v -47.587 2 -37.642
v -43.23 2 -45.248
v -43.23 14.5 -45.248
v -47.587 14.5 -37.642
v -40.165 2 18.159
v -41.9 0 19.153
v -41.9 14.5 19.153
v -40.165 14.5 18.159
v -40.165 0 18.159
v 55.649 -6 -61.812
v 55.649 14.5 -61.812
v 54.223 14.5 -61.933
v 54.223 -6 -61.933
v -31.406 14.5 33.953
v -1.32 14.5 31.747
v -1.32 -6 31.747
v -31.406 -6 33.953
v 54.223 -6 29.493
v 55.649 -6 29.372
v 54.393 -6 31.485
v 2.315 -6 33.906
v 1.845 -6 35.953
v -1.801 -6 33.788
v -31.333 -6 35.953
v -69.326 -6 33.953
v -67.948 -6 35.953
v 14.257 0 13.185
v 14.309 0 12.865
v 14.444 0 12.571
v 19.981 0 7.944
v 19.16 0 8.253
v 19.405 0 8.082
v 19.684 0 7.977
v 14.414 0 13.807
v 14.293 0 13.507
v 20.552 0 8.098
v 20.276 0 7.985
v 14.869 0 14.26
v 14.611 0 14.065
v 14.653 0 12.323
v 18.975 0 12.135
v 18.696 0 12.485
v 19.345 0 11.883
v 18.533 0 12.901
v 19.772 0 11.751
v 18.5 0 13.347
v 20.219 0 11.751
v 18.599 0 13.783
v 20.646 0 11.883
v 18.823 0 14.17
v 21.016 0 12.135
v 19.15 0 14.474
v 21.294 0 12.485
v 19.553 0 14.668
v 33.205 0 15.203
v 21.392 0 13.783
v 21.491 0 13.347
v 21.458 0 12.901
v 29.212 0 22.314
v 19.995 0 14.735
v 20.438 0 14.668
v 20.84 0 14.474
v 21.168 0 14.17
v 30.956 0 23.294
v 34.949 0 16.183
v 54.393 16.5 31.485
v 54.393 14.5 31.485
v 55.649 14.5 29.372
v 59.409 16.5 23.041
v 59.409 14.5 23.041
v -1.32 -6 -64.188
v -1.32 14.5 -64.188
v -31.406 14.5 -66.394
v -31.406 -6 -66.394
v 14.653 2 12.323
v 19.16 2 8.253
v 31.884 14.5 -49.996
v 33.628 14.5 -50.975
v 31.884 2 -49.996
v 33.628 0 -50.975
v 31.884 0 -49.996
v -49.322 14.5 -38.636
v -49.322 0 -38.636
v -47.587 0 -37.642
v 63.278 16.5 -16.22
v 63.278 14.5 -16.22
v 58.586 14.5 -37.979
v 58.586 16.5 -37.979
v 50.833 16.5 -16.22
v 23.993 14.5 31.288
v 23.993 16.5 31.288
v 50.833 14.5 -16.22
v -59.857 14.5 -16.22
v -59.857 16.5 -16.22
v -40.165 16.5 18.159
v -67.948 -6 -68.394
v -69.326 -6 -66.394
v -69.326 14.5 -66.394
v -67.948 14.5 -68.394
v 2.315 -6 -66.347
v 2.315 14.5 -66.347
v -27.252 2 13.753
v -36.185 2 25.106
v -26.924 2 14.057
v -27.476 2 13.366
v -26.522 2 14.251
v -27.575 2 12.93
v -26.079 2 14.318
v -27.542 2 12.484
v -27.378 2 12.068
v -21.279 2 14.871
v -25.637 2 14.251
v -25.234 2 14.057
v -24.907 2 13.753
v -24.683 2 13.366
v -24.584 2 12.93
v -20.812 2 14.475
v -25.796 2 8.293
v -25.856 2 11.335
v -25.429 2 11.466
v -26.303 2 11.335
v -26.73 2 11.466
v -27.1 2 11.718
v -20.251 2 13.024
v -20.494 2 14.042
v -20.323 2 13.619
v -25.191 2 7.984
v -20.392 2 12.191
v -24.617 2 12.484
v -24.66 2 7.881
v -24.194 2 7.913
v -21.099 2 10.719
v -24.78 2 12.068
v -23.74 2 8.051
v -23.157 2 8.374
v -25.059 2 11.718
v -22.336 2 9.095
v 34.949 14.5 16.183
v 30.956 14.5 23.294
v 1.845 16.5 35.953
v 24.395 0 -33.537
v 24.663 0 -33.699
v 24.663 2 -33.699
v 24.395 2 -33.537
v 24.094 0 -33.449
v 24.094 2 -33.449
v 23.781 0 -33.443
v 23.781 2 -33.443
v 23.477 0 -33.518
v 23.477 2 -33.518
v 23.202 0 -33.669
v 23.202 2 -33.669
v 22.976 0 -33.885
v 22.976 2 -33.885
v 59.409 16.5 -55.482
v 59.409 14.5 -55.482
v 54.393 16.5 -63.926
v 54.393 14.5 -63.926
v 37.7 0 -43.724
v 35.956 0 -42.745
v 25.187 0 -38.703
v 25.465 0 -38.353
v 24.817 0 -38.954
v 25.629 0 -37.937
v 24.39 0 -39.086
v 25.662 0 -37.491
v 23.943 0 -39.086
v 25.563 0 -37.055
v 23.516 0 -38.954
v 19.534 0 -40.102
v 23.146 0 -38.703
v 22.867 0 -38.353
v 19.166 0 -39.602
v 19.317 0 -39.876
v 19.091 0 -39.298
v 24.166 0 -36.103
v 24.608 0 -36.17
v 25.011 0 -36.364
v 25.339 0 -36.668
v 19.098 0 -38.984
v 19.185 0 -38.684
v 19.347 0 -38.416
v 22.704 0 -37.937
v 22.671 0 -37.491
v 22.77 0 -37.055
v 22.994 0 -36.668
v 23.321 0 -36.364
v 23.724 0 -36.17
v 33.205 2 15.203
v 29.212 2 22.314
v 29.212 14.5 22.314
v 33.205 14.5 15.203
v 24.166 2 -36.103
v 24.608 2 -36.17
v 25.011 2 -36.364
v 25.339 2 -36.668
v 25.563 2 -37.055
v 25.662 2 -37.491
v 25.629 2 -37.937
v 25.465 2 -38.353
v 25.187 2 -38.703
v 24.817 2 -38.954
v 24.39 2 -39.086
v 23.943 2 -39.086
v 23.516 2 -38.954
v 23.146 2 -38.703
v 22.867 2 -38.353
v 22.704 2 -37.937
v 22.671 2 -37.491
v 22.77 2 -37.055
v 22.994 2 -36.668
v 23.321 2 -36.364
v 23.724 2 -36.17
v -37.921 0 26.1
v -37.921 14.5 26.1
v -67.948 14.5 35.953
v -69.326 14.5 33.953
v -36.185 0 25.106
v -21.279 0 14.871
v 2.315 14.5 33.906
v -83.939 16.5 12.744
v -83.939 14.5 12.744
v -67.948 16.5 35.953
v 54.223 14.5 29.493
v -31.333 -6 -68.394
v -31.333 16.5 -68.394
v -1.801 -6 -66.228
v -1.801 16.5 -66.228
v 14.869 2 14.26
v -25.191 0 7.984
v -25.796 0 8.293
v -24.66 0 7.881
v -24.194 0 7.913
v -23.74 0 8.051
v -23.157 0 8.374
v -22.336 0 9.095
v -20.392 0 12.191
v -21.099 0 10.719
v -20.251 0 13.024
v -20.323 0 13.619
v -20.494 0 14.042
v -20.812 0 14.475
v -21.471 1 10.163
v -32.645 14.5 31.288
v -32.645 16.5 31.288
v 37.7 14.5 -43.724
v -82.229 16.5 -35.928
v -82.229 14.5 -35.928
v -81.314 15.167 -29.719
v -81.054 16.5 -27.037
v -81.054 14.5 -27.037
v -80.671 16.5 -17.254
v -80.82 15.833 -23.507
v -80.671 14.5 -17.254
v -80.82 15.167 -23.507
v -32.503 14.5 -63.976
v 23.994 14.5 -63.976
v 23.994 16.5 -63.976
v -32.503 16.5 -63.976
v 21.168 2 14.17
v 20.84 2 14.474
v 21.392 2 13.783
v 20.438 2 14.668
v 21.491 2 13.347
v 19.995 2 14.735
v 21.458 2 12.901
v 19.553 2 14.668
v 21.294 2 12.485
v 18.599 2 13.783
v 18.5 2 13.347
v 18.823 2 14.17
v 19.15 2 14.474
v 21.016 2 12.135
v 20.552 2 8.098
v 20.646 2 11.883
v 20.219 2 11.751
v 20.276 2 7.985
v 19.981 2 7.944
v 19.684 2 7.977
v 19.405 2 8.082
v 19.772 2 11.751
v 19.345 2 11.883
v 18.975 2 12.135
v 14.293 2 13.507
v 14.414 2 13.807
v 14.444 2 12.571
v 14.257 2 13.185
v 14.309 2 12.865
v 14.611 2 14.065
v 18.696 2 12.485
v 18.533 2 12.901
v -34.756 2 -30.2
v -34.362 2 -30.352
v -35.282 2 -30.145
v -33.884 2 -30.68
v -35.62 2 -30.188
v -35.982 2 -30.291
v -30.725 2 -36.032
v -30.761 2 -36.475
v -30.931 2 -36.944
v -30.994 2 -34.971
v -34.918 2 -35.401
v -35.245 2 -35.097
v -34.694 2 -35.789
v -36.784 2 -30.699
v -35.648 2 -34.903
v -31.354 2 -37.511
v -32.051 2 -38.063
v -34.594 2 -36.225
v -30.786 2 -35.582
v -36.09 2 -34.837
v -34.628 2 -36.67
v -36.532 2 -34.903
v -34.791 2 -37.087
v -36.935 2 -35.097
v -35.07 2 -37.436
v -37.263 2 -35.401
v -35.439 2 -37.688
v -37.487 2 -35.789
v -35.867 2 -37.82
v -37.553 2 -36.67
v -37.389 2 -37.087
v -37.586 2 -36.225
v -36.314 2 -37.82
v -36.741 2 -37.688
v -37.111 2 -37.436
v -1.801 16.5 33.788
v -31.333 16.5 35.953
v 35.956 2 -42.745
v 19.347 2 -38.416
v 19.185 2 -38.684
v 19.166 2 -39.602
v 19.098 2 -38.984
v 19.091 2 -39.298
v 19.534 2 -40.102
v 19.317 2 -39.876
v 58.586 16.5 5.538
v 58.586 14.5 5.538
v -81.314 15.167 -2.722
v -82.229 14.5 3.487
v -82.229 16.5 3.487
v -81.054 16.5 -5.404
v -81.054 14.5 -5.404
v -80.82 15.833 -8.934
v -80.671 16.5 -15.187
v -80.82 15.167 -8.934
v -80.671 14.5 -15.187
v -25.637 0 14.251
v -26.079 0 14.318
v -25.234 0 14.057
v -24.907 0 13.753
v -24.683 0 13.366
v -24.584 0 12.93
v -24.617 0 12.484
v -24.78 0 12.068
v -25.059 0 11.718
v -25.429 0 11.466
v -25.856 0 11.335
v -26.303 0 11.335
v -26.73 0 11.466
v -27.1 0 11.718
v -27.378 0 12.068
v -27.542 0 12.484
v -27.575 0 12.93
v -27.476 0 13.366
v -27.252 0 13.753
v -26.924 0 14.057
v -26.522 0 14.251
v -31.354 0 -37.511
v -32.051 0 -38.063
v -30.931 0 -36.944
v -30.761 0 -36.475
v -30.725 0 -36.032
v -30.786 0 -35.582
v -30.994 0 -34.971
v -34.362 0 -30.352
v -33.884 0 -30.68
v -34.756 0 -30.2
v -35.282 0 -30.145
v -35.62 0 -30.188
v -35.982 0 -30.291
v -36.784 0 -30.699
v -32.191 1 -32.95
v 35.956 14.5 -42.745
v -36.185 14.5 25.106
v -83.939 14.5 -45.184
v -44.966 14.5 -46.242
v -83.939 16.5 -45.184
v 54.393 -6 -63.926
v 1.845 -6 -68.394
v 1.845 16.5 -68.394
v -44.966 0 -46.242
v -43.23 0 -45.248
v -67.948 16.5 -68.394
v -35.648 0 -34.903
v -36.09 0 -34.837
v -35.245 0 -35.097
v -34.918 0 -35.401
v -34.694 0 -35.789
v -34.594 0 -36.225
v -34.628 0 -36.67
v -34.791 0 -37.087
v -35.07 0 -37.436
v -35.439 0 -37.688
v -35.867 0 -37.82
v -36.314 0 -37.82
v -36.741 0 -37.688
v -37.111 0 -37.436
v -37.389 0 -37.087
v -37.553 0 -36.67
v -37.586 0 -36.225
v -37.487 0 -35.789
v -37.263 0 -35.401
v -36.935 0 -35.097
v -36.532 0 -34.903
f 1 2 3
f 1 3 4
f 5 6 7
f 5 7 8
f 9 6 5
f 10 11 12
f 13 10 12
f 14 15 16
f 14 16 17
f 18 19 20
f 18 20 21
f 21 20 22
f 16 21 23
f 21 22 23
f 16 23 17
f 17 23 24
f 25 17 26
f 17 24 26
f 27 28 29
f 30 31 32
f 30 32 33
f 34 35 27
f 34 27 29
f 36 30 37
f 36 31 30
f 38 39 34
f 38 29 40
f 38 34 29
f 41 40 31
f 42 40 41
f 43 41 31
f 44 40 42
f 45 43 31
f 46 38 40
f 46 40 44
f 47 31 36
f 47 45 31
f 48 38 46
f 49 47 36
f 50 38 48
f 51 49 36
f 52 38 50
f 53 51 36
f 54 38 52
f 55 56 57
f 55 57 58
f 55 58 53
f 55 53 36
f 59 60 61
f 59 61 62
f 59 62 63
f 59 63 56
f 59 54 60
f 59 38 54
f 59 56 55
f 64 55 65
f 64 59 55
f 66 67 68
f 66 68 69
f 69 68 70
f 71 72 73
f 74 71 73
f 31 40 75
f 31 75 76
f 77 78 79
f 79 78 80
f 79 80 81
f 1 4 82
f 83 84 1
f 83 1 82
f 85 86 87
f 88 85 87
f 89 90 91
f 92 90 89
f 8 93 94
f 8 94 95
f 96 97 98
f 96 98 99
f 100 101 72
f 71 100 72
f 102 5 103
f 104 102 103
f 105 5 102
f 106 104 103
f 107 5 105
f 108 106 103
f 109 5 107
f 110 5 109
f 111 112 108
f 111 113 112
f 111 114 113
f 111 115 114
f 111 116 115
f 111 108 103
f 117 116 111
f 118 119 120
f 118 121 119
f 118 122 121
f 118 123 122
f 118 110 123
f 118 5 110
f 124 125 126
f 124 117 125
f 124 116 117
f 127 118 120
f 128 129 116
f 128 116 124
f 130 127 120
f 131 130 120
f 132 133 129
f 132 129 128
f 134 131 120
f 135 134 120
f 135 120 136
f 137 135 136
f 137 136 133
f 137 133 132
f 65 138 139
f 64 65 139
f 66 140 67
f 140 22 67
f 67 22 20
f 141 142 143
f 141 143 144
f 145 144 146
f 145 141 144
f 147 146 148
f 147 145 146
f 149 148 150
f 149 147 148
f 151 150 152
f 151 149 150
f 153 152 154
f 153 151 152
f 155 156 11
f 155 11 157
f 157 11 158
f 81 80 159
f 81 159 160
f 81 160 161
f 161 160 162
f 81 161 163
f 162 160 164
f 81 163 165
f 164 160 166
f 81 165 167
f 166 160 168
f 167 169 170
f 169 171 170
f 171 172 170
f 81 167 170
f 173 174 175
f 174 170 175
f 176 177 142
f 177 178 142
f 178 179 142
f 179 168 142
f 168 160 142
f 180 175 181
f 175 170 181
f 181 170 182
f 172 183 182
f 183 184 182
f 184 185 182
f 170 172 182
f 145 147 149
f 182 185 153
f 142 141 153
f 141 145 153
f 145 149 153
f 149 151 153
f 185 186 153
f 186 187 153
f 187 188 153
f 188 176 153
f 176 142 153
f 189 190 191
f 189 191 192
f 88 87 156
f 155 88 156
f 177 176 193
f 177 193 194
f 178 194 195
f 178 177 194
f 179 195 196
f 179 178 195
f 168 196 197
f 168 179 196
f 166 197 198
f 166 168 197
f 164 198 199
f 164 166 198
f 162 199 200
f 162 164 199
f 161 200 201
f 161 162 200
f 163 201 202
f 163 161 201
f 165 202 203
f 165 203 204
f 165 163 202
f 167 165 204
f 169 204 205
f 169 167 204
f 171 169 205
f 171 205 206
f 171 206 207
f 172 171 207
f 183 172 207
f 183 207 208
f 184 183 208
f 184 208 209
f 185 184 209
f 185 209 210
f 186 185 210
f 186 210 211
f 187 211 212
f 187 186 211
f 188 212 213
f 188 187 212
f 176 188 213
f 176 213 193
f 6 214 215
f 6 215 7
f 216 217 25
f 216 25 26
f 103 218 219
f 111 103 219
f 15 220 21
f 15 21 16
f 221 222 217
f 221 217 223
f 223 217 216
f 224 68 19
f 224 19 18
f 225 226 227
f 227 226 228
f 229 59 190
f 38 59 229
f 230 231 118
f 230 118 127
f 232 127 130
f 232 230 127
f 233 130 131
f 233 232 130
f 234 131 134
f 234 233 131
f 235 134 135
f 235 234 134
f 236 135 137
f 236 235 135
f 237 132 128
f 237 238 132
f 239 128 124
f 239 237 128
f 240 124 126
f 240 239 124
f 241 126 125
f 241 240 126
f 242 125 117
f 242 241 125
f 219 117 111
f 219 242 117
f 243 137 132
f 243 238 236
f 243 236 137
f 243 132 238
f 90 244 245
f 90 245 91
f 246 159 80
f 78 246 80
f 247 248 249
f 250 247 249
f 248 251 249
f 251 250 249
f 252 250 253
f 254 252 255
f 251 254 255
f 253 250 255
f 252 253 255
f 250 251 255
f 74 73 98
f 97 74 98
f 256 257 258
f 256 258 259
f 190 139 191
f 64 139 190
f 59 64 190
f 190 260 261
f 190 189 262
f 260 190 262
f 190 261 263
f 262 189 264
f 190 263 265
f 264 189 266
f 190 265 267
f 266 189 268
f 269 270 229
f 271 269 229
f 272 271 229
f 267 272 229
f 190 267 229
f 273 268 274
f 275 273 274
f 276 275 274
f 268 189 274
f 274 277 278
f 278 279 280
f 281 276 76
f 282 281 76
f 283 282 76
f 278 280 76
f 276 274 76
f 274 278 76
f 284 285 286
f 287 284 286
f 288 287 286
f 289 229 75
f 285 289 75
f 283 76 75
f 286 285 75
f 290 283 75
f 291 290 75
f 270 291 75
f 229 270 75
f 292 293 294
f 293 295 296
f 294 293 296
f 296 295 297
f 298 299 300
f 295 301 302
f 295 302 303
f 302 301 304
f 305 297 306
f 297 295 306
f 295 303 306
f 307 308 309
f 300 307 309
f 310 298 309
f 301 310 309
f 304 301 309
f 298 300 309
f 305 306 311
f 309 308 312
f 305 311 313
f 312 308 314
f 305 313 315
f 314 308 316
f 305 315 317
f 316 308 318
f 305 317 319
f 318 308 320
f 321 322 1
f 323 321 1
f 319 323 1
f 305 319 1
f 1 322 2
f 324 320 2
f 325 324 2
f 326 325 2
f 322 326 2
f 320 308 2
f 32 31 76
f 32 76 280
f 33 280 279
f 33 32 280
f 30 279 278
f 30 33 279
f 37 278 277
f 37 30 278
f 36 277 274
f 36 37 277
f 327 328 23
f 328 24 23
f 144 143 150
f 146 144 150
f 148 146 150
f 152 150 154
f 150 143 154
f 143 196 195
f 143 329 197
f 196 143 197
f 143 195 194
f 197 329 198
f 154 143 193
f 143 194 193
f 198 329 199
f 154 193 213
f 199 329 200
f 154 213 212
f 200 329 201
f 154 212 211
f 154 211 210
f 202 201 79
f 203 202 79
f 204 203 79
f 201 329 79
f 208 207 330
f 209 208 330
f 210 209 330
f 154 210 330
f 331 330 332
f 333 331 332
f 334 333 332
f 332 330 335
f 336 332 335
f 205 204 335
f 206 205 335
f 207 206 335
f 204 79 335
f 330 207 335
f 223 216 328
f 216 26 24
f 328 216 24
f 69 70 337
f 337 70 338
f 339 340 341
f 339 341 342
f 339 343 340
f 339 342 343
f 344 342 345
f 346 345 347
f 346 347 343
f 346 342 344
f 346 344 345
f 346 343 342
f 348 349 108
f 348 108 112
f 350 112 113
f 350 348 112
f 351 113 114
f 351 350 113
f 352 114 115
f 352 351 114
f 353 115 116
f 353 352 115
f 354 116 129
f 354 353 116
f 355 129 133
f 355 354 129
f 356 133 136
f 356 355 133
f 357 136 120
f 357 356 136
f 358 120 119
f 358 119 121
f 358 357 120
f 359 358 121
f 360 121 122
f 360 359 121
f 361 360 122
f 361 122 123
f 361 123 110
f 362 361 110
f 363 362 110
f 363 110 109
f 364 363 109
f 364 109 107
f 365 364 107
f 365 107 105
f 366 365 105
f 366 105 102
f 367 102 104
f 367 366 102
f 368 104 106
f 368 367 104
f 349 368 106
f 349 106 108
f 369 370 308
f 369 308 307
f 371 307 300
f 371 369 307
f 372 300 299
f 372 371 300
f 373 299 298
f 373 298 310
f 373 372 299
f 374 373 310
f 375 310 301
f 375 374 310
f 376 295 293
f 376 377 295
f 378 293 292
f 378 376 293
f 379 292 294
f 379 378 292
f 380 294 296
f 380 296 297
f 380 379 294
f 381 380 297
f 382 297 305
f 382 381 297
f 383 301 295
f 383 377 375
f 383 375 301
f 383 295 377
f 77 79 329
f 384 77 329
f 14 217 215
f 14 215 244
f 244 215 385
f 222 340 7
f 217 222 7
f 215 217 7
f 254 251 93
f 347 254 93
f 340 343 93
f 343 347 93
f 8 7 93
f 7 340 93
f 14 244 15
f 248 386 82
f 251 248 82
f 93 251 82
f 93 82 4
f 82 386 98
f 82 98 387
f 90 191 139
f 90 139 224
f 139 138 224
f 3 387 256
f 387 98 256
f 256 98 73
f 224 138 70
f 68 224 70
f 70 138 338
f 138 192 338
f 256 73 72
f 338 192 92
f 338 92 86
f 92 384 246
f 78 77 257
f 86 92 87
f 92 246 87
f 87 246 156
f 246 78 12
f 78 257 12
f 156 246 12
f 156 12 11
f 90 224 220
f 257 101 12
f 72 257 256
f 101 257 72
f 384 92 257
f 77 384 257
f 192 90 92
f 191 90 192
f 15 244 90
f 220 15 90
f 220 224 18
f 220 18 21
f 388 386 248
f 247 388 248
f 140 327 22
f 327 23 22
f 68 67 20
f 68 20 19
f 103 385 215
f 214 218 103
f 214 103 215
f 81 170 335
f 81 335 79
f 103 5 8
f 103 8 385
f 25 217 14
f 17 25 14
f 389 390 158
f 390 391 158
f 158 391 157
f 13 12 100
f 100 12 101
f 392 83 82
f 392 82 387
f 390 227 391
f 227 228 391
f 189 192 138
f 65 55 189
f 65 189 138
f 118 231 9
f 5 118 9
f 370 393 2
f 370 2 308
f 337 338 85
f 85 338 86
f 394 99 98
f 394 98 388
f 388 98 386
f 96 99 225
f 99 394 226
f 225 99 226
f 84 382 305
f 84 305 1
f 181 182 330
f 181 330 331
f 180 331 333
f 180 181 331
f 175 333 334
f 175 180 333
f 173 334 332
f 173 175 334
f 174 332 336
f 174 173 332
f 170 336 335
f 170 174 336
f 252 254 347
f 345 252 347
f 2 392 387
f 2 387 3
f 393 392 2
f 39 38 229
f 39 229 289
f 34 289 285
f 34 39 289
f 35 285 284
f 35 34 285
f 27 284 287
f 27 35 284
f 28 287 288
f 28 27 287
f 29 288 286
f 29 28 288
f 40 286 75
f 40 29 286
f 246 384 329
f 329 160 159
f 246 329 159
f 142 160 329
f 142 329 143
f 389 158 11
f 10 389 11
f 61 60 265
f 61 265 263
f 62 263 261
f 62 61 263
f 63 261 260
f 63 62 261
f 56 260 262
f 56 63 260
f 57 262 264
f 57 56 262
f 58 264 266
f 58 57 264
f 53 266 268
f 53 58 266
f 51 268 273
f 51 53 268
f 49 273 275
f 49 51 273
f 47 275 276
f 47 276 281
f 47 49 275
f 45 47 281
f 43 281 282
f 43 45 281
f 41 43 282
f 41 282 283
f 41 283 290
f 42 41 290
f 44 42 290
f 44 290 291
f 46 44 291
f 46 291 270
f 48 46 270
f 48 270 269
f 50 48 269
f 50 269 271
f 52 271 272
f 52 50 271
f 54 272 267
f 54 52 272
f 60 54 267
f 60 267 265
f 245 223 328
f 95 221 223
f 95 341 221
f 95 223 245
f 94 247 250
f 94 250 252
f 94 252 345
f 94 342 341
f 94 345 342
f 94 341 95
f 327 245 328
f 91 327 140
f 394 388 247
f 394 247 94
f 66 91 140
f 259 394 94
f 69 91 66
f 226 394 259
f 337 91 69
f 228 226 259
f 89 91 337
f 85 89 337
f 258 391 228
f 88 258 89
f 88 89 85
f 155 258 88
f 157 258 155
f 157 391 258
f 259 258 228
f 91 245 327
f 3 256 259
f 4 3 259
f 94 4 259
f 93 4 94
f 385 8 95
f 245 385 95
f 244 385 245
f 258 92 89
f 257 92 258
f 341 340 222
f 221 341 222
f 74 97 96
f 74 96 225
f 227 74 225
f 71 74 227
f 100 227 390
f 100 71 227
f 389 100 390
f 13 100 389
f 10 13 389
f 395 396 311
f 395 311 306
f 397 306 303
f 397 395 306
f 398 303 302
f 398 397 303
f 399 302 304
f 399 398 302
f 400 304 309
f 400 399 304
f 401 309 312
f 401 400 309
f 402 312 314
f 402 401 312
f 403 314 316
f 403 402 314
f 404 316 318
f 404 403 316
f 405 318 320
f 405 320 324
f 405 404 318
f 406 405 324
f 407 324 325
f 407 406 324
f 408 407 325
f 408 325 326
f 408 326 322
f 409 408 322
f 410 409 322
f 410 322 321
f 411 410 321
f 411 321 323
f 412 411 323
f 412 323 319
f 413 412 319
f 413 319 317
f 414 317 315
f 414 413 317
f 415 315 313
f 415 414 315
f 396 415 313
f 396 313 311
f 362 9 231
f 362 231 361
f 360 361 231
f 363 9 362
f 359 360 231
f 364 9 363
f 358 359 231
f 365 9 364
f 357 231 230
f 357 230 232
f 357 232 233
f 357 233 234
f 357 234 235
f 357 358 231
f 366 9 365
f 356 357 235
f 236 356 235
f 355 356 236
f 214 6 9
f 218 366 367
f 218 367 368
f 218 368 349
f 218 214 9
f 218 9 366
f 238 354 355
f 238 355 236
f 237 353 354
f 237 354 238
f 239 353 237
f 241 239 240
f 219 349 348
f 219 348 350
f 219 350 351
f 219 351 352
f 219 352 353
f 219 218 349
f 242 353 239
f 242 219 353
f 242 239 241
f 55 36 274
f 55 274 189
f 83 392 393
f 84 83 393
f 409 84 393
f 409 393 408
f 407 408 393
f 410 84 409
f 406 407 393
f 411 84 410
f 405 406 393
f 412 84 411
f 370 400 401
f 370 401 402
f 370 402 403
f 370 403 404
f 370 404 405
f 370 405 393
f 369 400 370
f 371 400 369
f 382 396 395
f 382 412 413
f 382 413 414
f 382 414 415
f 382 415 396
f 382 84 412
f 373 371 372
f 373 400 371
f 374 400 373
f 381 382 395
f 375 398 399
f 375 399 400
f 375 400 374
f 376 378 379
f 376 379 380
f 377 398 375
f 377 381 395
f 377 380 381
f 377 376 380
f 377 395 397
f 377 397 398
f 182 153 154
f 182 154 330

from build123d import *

# Parameters (mm, degrees)
SKETCH2_R             = 1.5
BOSS_EXTRUDE3_DEPTH   = 2
BOSS_EXTRUDE3_2_DEPTH = 2
BOSS_EXTRUDE3_3_DEPTH = 2
BOSS_EXTRUDE3_4_DEPTH = 2
BOSS_EXTRUDE7_DEPTH   = 14.5
BOSS_EXTRUDE8_DEPTH   = 2
BOSS_EXTRUDE9_DEPTH   = 20.5


with BuildPart() as part:
    # Sketch2 → Boss-Extrude3 (new body)
    with BuildSketch(Plane(origin=(0, 0, 0), x_dir=(1, 0, 0), z_dir=(0, 1, 0))):
        with BuildLine():
            Line((-43.230453913, 45.247658967), (-32.051235735, 38.062807212))
            add(Edge.make_bspline(
                [(-32.051235735, 38.062807212), (-29.653859452, 36.522020287), (-32.359204514, 33.058015897), (-34.393292894, 29.162596744), (-36.78390878, 30.699038781)],
                knots=[0, 0, 0, 0, 0.5, 1, 1, 1, 1], degree=3))
            Line((-36.78390878, 30.699038781), (-47.586935967, 37.642113656))
            Line((-47.586935967, 37.642113656), (-43.230453913, 45.247658967))
        make_face()
        with Locations(Location((-36.090252253, 36.336715974, 0), (0, 0, 270))):
            Circle(SKETCH2_R, mode=Mode.SUBTRACT)
    extrude(amount=BOSS_EXTRUDE3_DEPTH)



with BuildPart() as body_2:
    # Sketch2 → Boss-Extrude3 2 (new body)
    with BuildSketch(Plane(origin=(0, 0, 0), x_dir=(1, 0, 0), z_dir=(0, 1, 0))):
        with BuildLine():
            Line((-36.185423109, -25.10610692), (-21.279130416, -14.871322122))
            add(Edge.make_bspline(
                [(-25.795747584, -8.293165489), (-24.143697719, -7.158854283), (-21.111071083, -9.916279371), (-19.518538576, -13.662485091), (-21.279130416, -14.871322122)],
                knots=[0, 0, 0, 0, 0.5, 1, 1, 1, 1], degree=3))
            Line((-25.795747584, -8.293165489), (-40.164732197, -18.159030081))
            Line((-40.164732197, -18.159030081), (-36.185423109, -25.10610692))
        make_face()
        with Locations(Location((-26.079416612, -12.817810533, 0), (0, 0, 270))):
            Circle(SKETCH2_R, mode=Mode.SUBTRACT)
    extrude(amount=BOSS_EXTRUDE3_2_DEPTH)


with BuildPart() as body_3:
    # Sketch2 → Boss-Extrude3 3 (new body)
    with BuildSketch(Plane(origin=(0, 0, 0), x_dir=(1, 0, 0), z_dir=(0, 1, 0))):
        with BuildLine():
            Line((29.211666773, -22.314450198), (14.869230537, -14.260003913))
            ThreePointArc((14.869230537, -14.260003913), (14.264243858, -13.347032924), (14.652672015, -12.322997536))
            Line((14.652672015, -12.322997536), (19.160499642, -8.253264805))
            ThreePointArc((19.160499642, -8.253264805), (19.831311373, -7.951400174), (20.552224713, -8.097669073))
            Line((20.552224713, -8.097669073), (33.205147834, -15.203316117))
            Line((33.205147834, -15.203316117), (29.211666773, -22.314450198))
        make_face()
        with Locations(Location((19.995405598, -13.234640771, 0), (0, 0, 270))):
            Circle(SKETCH2_R, mode=Mode.SUBTRACT)
    extrude(amount=BOSS_EXTRUDE3_3_DEPTH)


with BuildPart() as body_4:
    # Sketch2 → Boss-Extrude3 4 (new body)
    with BuildSketch(Plane(origin=(0, 0, 0), x_dir=(1, 0, 0), z_dir=(0, 1, 0))):
        with BuildLine():
            Line((35.956282792, 42.745174925), (24.662993698, 33.699023938))
            ThreePointArc((24.662993698, 33.699023938), (23.78100089, 33.442857668), (22.976200889, 33.885383856))
            Line((22.976200889, 33.885383856), (19.347327143, 38.415699606))
            ThreePointArc((19.347327143, 38.415699606), (19.091160873, 39.297692414), (19.533687061, 40.102492416))
            Line((19.533687061, 40.102492416), (31.884499443, 49.995740759))
            Line((31.884499443, 49.995740759), (35.956282792, 42.745174925))
        make_face()
        with Locations(Location((24.166347117, 37.603010106, 0), (0, 0, 270))):
            Circle(SKETCH2_R, mode=Mode.SUBTRACT)
    extrude(amount=BOSS_EXTRUDE3_4_DEPTH)


with BuildPart() as part_1:
    add(part.part)

    add(body_2.part)  # Boss-Extrude7 merges body 2

    add(body_3.part)  # Boss-Extrude7 merges body 3

    add(body_4.part)  # Boss-Extrude7 merges body 4
    # Sketch7 → Boss-Extrude7 (add)
    with BuildSketch(Plane.XZ):
        Polygon((-36.185423109, 25.10610692), (-37.920880681, 26.100182881), (-41.900189769, 19.153106042), (-40.164732197, 18.159030081), align=None)
        Polygon((-43.230453913, -45.247658967), (-47.586935967, -37.642113656), (-49.322393538, -38.636189617), (-44.965911485, -46.241734929), align=None)
        Polygon((31.884499443, -49.995740759), (35.956282792, -42.745174925), (37.700117882, -43.724480381), (33.628334533, -50.975046216), align=None)
        Polygon((29.211666773, 22.314450198), (33.205147834, 15.203316117), (34.948982925, 16.182621573), (30.955501863, 23.293755654), align=None)
    extrude(amount=-BOSS_EXTRUDE7_DEPTH)

    # Sketch8 → Boss-Extrude8 (add)
    with BuildSketch(Plane(origin=(0, 14.5, 0), x_dir=(1, 0, 0), z_dir=(0, 1, 0))):
        with BuildLine():
            Line((-83.939033809, -12.743691802), (-67.948382544, -35.953321652))
            Line((-67.948382544, -35.953321652), (-31.333133825, -35.953321652))
            Line((-31.333133825, -35.953321652), (-1.800901789, -33.787598607))
            Line((-1.800901789, -33.787598607), (1.845003483, -35.953321652))
            Line((1.845003483, -35.953321652), (54.392894937, -31.485495915))
            Line((54.392894937, -31.485495915), (59.409090539, -23.040937859))
            Line((59.409090539, -23.040937859), (58.585665433, -5.537982821))
            Line((58.585665433, -5.537982821), (63.277626353, 16.220382558))
            Line((63.277626353, 16.220382558), (58.585665433, 37.978747936))
            Line((58.585665433, 37.978747936), (59.409090539, 55.481702974))
            Line((59.409090539, 55.481702974), (54.392894937, 63.926261031))
            Line((54.392894937, 63.926261031), (1.845003483, 68.394086768))
            Line((1.845003483, 68.394086768), (-1.800901789, 66.228363722))
            Line((-1.800901789, 66.228363722), (-31.333133825, 68.394086768))
            Line((-31.333133825, 68.394086768), (-67.948382544, 68.394086768))
            Line((-67.948382544, 68.394086768), (-83.939033809, 45.184456918))
            Line((-83.939033809, 45.184456918), (-82.229044773, 35.927906641))
            add(Edge.make_bspline(
                [(-82.229044773, 35.927906641), (-81.079922832, 29.707454467), (-80.671423408, 23.540442654), (-80.671423408, 17.253629197)],
                knots=[0, 0, 0, 0, 1, 1, 1, 1], degree=3))
            Line((-80.671423408, 17.253629197), (-80.671423408, 15.187135918))
            add(Edge.make_bspline(
                [(-82.229044773, -3.487141526), (-81.079922832, 2.733310648), (-80.671423408, 8.900322461), (-80.671423408, 15.187135918)],
                knots=[0, 0, 0, 0, 1, 1, 1, 1], degree=3))
            Line((-82.229044773, -3.487141526), (-83.939033809, -12.743691802))
        make_face()
        Polygon((-59.857375923, 16.220382558), (-40.164732197, -18.159030081), (-32.644643784, -31.287598607), (23.993388186, -31.287598607), (50.833438729, 16.220382558), (23.99393098, 63.976016309), (-32.502787546, 63.976016309), align=None, mode=Mode.SUBTRACT)
    extrude(amount=BOSS_EXTRUDE8_DEPTH)

    # Sketch9 → Boss-Extrude9 (add)
    with BuildSketch(Plane.XZ.offset(-14.5)):
        Polygon((-67.948382544, -66.394086768), (-69.326315011, -66.394086768), (-67.948382544, -68.394086768), (-31.333133825, -68.394086768), (-1.800901789, -66.228363722), (1.845003483, -68.394086768), (54.392894937, -63.926261031), (55.648633387, -61.81227723), (54.223458503, -61.933451132), (2.314827743, -66.346924443), (-1.320082635, -64.187732531), (-31.406369708, -66.394086768), align=None)
        Polygon((-67.948382544, 33.953321652), (-69.326315011, 33.953321652), (-67.948382544, 35.953321652), (-31.333133825, 35.953321652), (-1.800901789, 33.787598607), (1.845003483, 35.953321652), (54.392894937, 31.485495915), (55.648633387, 29.371512115), (54.223458503, 29.492686016), (2.314827743, 33.906159327), (-1.320082635, 31.746967416), (-31.406369708, 33.953321652), align=None)
    extrude(amount=BOSS_EXTRUDE9_DEPTH)


solid = part_1.part
